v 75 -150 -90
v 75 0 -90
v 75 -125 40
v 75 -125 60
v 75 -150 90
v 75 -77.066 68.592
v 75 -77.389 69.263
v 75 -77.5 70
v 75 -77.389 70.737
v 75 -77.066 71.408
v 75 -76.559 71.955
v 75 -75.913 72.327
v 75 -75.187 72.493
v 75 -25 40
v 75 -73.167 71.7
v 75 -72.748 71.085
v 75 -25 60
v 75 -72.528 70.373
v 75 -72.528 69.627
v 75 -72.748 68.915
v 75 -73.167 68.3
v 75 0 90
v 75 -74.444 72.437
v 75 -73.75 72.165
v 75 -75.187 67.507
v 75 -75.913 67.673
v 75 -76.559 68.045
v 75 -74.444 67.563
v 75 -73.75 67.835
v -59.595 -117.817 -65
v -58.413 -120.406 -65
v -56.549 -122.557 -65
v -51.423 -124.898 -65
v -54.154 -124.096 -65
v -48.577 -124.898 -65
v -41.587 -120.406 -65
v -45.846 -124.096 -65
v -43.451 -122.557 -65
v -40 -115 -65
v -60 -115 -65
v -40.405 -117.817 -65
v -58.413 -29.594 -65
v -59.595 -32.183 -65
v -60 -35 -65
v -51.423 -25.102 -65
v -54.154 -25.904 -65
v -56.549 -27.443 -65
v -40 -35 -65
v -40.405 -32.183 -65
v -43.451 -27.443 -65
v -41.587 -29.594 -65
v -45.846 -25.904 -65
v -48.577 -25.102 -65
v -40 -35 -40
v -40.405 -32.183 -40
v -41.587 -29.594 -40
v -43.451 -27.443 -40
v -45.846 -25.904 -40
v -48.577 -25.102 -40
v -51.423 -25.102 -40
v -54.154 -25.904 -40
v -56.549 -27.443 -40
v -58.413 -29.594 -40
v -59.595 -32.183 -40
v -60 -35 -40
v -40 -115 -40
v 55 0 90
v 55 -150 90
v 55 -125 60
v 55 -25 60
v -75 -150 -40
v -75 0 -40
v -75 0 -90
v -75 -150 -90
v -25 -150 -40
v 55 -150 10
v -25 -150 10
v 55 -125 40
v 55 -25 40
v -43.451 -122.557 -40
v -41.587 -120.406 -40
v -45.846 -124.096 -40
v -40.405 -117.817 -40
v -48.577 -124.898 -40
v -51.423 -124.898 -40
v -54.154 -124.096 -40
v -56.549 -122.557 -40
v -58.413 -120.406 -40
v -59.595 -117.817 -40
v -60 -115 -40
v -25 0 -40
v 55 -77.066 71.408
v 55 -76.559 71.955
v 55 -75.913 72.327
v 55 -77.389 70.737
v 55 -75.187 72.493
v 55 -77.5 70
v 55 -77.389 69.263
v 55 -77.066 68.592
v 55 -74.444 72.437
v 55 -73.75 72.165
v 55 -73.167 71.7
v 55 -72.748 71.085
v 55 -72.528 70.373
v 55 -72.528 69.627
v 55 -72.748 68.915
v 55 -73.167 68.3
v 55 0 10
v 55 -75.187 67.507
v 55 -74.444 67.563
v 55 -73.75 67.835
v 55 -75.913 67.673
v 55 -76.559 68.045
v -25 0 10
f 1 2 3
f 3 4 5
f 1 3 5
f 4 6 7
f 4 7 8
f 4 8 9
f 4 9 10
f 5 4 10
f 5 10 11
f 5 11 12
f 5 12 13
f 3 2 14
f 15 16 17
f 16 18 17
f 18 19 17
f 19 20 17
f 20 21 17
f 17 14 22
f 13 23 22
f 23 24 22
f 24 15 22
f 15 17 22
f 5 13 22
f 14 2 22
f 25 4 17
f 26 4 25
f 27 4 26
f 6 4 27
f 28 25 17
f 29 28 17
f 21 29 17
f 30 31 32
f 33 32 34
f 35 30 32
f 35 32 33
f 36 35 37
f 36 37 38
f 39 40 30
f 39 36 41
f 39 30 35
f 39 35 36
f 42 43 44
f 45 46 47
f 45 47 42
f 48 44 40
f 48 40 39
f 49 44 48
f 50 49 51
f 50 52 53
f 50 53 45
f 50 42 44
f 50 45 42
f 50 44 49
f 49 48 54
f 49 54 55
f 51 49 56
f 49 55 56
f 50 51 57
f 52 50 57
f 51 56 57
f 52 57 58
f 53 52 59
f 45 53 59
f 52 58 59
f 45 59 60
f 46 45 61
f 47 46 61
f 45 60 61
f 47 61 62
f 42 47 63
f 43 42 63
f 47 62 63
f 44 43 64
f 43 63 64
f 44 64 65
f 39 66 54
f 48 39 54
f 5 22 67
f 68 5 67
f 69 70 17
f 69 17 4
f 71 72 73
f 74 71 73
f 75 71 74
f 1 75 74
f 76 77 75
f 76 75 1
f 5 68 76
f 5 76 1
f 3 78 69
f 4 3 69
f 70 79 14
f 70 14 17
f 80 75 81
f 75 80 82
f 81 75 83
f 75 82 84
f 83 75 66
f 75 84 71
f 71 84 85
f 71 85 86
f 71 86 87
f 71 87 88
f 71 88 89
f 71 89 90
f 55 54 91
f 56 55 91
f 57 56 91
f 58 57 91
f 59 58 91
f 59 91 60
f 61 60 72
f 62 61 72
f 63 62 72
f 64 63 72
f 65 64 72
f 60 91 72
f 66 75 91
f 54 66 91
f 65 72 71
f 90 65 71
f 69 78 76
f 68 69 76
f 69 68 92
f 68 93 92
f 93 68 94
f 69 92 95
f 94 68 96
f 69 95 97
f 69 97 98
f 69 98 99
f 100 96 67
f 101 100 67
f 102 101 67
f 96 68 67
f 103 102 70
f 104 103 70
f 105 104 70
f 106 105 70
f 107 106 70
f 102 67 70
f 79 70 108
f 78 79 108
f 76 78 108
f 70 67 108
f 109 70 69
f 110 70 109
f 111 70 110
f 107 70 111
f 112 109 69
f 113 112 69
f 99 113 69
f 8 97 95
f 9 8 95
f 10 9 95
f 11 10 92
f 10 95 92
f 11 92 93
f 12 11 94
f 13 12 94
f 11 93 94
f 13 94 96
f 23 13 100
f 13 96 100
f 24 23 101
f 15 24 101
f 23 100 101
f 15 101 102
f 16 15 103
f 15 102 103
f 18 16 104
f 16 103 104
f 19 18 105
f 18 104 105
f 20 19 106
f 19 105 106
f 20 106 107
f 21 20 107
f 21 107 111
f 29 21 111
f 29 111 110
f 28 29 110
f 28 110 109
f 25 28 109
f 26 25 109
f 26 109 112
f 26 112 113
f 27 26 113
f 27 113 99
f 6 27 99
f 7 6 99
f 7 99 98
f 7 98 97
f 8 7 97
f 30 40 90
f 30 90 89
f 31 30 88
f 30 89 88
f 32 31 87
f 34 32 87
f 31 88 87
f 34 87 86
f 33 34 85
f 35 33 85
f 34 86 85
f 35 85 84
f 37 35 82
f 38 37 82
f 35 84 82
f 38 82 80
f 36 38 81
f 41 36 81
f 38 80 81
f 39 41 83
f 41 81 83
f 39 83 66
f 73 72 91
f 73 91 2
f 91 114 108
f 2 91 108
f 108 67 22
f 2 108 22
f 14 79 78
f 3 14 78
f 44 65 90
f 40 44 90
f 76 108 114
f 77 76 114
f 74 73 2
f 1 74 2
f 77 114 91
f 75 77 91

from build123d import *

# Parameters (mm, degrees)
F1_DEPTH = 150
F2_W     = 100
F2_H     = 20
F3_DEPTH = 20.001
F6_DEPTH = 25
F4_R     = 2.5
F7_DEPTH = 20.001


with BuildPart() as f1:
    # F0 (on Front) → F1 (new body)
    with BuildSketch(Plane.XZ):
        Polygon((75, -90), (75, 90), (55, 90), (55, 10), (-25, 10), (-25, -40), (-75, -40), (-75, -90), align=None)
    extrude(amount=F1_DEPTH)

    # F2 (on face) → F3 (cut, through all)
    with BuildSketch(Plane(origin=(55, 0, 0), x_dir=(0, -1, 0), z_dir=(-1, 0, 0))):
        with Locations((75, 50)):
            Rectangle(F2_W, F2_H)
    extrude(amount=-F3_DEPTH, mode=Mode.SUBTRACT)

    # F5 (on face) → F6 (cut)
    with BuildSketch(Plane.XY.offset(-40)):
        with BuildLine():
            ThreePointArc((-40, -35), (-50, -25), (-60, -35))
            Line((-60, -35), (-60, -115))
            ThreePointArc((-60, -115), (-50, -125), (-40, -115))
            Line((-40, -115), (-40, -35))
        make_face()
    extrude(amount=-F6_DEPTH, mode=Mode.SUBTRACT)

    # F4 (on face) → F7 (cut, through all)
    with BuildSketch(Plane(origin=(55, 0, 0), x_dir=(0, -1, 0), z_dir=(-1, 0, 0))):
        with Locations((75, 70)):
            Circle(F4_R)
    extrude(amount=-F7_DEPTH, mode=Mode.SUBTRACT)


solid = f1.part
